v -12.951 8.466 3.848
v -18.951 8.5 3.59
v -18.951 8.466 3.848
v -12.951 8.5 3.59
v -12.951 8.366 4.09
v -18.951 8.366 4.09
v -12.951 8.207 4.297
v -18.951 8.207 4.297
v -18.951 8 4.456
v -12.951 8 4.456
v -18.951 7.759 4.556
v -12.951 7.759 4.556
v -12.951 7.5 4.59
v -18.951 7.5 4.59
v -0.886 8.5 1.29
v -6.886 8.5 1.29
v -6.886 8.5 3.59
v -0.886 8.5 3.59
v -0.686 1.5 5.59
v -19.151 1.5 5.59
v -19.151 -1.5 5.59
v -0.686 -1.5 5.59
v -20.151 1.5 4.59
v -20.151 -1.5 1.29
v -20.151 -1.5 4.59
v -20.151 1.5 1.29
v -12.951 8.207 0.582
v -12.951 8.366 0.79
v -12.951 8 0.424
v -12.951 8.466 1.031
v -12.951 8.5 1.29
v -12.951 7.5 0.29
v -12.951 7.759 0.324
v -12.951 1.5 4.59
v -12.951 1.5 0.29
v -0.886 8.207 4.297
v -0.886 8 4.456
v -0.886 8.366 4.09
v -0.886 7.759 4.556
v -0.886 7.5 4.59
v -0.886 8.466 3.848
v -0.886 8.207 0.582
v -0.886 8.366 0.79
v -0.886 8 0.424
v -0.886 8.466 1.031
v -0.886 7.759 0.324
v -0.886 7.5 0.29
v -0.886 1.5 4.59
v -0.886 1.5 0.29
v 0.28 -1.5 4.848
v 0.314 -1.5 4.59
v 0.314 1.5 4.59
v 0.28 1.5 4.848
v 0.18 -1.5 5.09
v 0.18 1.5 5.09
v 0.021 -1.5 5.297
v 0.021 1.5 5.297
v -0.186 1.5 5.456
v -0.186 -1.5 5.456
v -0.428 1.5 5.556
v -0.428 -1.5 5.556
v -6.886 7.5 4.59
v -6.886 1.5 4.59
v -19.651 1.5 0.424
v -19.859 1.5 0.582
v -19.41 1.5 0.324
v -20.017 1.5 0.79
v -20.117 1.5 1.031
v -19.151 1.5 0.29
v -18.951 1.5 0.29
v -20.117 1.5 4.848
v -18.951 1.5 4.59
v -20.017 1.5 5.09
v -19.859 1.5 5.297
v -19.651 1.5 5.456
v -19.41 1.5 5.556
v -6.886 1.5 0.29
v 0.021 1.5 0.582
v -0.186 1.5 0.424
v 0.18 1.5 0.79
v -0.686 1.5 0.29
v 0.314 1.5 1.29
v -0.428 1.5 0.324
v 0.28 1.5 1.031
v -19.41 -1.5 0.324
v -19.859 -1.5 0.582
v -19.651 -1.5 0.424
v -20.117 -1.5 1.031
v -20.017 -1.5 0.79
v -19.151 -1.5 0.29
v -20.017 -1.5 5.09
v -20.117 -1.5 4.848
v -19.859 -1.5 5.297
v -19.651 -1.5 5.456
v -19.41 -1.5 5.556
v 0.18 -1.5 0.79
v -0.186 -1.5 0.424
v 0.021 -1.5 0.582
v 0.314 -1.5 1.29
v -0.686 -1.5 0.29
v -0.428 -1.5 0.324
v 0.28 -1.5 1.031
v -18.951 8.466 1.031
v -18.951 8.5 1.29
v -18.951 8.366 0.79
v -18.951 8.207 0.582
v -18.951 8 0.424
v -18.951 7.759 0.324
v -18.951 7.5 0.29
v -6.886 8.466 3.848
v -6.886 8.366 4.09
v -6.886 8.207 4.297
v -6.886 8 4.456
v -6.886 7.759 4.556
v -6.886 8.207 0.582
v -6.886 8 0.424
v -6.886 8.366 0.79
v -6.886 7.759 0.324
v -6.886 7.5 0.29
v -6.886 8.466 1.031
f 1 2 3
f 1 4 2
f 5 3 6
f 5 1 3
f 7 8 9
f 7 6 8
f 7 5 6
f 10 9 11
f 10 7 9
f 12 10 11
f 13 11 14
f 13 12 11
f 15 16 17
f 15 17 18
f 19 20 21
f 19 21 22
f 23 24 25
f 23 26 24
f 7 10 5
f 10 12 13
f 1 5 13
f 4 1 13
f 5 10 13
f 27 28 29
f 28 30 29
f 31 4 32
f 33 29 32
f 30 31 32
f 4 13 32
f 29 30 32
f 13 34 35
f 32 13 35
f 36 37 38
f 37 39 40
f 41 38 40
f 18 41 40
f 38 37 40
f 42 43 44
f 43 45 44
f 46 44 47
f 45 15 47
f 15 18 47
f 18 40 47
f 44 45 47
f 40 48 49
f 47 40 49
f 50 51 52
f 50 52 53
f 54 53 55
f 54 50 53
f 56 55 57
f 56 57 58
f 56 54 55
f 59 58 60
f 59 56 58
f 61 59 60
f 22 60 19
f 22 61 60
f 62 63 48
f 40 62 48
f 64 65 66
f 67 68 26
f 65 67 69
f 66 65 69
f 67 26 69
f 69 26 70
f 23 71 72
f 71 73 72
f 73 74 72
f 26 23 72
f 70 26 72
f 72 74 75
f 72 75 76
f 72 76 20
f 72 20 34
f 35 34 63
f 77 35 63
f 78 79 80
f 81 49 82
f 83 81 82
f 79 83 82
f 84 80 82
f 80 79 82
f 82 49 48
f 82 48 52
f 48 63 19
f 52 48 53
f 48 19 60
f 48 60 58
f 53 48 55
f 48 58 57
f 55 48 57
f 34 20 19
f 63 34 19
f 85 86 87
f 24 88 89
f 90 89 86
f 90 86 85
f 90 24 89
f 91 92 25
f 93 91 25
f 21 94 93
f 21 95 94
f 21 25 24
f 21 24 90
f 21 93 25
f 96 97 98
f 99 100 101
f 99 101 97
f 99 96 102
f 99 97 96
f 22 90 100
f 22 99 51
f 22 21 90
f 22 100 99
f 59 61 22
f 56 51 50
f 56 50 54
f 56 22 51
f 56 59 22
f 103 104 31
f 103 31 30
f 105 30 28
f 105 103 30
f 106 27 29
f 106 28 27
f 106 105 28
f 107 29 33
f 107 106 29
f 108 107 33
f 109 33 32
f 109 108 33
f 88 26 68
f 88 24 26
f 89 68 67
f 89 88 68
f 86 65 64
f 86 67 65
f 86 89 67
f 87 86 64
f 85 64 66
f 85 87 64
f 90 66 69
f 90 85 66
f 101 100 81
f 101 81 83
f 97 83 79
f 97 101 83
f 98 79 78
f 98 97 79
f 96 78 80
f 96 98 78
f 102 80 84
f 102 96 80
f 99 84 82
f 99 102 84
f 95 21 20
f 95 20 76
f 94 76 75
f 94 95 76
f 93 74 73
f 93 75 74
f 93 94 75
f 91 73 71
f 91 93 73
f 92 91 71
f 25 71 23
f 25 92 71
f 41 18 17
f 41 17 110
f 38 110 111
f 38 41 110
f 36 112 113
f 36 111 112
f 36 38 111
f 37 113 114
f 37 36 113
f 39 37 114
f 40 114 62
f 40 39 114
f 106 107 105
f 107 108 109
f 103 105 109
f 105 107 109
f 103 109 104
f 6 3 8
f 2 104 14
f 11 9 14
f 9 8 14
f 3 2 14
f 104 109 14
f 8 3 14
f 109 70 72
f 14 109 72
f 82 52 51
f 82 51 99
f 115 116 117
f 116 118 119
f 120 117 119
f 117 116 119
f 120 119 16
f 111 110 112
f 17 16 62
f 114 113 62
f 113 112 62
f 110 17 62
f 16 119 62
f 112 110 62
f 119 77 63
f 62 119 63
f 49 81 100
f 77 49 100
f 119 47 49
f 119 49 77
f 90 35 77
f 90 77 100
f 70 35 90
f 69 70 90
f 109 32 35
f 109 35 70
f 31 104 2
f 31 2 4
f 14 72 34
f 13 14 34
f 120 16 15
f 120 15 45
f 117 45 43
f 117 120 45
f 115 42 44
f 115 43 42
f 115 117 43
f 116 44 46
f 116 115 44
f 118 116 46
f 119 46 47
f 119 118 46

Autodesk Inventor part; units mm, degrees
ref_plane "YZ Plane" through (0, 0, 0) normal (1, 0, 0) x (0, 1, 0)
ref_plane "XZ Plane" through (0, 0, 0) normal (0, 1, 0) x (-1, 0, 0)
ref_plane "XY Plane" through (0, 0, 0) normal (0, 0, 1) x (1, 0, 0)
ref_plane "Work Plane1" through (1.1136, 1.5, 0.2896) normal (0, -1, 0) x (1, 0, 0)
sketch "Sketch3" plane through (1.1136, 1.5, 0.2896) normal (0, -1, 0) x (1, 0, 0)
  line L0 (-8.5, 0) -> (-8.5, 5) construction
  line L1 (-8.5, 5) -> (-1.5, 5) construction
  line L2 (-1.5, 5) -> (-1.5, 0) construction
  line L3 (0, 0) -> (-1.5, 0) construction
  line L4 (0, 0) -> (0, 6) construction
  line L5 (0, 6) -> (-22.065, 6) construction
  line L6 (-22.065, 0) -> (-22.065, 6) construction
  line L7 (-20.565, 0) -> (-22.065, 0) construction
  line L8 (-20.565, 0) -> (-20.565, 5) construction
  line L9 (-20.565, 5) -> (-13.565, 5) construction
  line L10 (-13.565, 5) -> (-13.565, 0) construction
  line L11 (-8.5, 0) -> (-13.565, 0) construction
  line L12 (-0.8, 0) -> (-21.265, 0)
  line L13 (-21.265, 0) -> (-21.265, 5.3)
  line L14 (-21.265, 5.3) -> (-0.8, 5.3)
  line L15 (-0.8, 5.3) -> (-0.8, 0)
  point P0 (-1.1136, -0.2896)
  dimension "d26" = 0.8
  dimension "d27" = 0.8
  dimension "d28" = 0.7
extrude "Extrusion3" add sketch "Sketch3" along normal blind 3
sketch "Sketch4" plane through (1.1136, 1.5, 0.2896) normal (0, 1, 0) x (1, 0, 0)
  line L0 (-8.5, 0) -> (-8.5, -5) construction
  line L1 (-8.5, -5) -> (-1.5, -5) construction
  line L2 (-1.5, -5) -> (-1.5, 0) construction
  line L3 (0, 0) -> (-1.5, 0) construction
  line L4 (0, 0) -> (0, -6) construction
  line L5 (0, -6) -> (-22.065, -6) construction
  line L6 (-22.065, 0) -> (-22.065, -6) construction
  line L7 (-20.565, 0) -> (-22.065, 0) construction
  line L8 (-20.565, 0) -> (-20.565, -5) construction
  line L9 (-20.565, -5) -> (-13.565, -5) construction
  line L10 (-13.565, -5) -> (-13.565, 0) construction
  line L11 (-8.5, 0) -> (-13.565, 0) construction
  line L12 (-2, 0) -> (-8, 0)
  line L13 (-8, 0) -> (-8, -4.3)
  line L14 (-8, -4.3) -> (-2, -4.3)
  line L15 (-2, -4.3) -> (-2, 0)
  line L16 (-0.8, 0) -> (-21.265, 0) projected
  line L17 (-14.065, 0) -> (-20.065, 0)
  line L18 (-20.065, 0) -> (-20.065, -4.3)
  line L19 (-20.065, -4.3) -> (-14.065, -4.3)
  line L20 (-14.065, -4.3) -> (-14.065, 0)
  point P0 (-1.1136, 0.2896)
  point P1 (-5, 0)
  point P2 (-11.0325, 0)
  dimension "d31" = 0.5
  dimension "d32" = 0.5
  dimension "d33" = 0.7
  dimension "d34" = 0.7
  dimension "d35" = 0.5
  dimension "d36" = 0.5
extrude "Extrusion4" add sketch "Sketch4" along normal blind 7
fillet "Fillet6" radius 1 4 edges at (-20.1514, 0, 5.5896) (-20.1514, 0, 0.2896) (0.3136, 0, 5.5896) (0.3136, 0, 0.2896)
fillet "Fillet6" radius 1 4 edges at (-3.8864, 8.5, 4.5896) (-3.8864, 8.5, 0.2896) (-15.9514, 8.5, 0.2896) (-15.9514, 8.5, 4.5896)
properties part number "Holster_Button"
